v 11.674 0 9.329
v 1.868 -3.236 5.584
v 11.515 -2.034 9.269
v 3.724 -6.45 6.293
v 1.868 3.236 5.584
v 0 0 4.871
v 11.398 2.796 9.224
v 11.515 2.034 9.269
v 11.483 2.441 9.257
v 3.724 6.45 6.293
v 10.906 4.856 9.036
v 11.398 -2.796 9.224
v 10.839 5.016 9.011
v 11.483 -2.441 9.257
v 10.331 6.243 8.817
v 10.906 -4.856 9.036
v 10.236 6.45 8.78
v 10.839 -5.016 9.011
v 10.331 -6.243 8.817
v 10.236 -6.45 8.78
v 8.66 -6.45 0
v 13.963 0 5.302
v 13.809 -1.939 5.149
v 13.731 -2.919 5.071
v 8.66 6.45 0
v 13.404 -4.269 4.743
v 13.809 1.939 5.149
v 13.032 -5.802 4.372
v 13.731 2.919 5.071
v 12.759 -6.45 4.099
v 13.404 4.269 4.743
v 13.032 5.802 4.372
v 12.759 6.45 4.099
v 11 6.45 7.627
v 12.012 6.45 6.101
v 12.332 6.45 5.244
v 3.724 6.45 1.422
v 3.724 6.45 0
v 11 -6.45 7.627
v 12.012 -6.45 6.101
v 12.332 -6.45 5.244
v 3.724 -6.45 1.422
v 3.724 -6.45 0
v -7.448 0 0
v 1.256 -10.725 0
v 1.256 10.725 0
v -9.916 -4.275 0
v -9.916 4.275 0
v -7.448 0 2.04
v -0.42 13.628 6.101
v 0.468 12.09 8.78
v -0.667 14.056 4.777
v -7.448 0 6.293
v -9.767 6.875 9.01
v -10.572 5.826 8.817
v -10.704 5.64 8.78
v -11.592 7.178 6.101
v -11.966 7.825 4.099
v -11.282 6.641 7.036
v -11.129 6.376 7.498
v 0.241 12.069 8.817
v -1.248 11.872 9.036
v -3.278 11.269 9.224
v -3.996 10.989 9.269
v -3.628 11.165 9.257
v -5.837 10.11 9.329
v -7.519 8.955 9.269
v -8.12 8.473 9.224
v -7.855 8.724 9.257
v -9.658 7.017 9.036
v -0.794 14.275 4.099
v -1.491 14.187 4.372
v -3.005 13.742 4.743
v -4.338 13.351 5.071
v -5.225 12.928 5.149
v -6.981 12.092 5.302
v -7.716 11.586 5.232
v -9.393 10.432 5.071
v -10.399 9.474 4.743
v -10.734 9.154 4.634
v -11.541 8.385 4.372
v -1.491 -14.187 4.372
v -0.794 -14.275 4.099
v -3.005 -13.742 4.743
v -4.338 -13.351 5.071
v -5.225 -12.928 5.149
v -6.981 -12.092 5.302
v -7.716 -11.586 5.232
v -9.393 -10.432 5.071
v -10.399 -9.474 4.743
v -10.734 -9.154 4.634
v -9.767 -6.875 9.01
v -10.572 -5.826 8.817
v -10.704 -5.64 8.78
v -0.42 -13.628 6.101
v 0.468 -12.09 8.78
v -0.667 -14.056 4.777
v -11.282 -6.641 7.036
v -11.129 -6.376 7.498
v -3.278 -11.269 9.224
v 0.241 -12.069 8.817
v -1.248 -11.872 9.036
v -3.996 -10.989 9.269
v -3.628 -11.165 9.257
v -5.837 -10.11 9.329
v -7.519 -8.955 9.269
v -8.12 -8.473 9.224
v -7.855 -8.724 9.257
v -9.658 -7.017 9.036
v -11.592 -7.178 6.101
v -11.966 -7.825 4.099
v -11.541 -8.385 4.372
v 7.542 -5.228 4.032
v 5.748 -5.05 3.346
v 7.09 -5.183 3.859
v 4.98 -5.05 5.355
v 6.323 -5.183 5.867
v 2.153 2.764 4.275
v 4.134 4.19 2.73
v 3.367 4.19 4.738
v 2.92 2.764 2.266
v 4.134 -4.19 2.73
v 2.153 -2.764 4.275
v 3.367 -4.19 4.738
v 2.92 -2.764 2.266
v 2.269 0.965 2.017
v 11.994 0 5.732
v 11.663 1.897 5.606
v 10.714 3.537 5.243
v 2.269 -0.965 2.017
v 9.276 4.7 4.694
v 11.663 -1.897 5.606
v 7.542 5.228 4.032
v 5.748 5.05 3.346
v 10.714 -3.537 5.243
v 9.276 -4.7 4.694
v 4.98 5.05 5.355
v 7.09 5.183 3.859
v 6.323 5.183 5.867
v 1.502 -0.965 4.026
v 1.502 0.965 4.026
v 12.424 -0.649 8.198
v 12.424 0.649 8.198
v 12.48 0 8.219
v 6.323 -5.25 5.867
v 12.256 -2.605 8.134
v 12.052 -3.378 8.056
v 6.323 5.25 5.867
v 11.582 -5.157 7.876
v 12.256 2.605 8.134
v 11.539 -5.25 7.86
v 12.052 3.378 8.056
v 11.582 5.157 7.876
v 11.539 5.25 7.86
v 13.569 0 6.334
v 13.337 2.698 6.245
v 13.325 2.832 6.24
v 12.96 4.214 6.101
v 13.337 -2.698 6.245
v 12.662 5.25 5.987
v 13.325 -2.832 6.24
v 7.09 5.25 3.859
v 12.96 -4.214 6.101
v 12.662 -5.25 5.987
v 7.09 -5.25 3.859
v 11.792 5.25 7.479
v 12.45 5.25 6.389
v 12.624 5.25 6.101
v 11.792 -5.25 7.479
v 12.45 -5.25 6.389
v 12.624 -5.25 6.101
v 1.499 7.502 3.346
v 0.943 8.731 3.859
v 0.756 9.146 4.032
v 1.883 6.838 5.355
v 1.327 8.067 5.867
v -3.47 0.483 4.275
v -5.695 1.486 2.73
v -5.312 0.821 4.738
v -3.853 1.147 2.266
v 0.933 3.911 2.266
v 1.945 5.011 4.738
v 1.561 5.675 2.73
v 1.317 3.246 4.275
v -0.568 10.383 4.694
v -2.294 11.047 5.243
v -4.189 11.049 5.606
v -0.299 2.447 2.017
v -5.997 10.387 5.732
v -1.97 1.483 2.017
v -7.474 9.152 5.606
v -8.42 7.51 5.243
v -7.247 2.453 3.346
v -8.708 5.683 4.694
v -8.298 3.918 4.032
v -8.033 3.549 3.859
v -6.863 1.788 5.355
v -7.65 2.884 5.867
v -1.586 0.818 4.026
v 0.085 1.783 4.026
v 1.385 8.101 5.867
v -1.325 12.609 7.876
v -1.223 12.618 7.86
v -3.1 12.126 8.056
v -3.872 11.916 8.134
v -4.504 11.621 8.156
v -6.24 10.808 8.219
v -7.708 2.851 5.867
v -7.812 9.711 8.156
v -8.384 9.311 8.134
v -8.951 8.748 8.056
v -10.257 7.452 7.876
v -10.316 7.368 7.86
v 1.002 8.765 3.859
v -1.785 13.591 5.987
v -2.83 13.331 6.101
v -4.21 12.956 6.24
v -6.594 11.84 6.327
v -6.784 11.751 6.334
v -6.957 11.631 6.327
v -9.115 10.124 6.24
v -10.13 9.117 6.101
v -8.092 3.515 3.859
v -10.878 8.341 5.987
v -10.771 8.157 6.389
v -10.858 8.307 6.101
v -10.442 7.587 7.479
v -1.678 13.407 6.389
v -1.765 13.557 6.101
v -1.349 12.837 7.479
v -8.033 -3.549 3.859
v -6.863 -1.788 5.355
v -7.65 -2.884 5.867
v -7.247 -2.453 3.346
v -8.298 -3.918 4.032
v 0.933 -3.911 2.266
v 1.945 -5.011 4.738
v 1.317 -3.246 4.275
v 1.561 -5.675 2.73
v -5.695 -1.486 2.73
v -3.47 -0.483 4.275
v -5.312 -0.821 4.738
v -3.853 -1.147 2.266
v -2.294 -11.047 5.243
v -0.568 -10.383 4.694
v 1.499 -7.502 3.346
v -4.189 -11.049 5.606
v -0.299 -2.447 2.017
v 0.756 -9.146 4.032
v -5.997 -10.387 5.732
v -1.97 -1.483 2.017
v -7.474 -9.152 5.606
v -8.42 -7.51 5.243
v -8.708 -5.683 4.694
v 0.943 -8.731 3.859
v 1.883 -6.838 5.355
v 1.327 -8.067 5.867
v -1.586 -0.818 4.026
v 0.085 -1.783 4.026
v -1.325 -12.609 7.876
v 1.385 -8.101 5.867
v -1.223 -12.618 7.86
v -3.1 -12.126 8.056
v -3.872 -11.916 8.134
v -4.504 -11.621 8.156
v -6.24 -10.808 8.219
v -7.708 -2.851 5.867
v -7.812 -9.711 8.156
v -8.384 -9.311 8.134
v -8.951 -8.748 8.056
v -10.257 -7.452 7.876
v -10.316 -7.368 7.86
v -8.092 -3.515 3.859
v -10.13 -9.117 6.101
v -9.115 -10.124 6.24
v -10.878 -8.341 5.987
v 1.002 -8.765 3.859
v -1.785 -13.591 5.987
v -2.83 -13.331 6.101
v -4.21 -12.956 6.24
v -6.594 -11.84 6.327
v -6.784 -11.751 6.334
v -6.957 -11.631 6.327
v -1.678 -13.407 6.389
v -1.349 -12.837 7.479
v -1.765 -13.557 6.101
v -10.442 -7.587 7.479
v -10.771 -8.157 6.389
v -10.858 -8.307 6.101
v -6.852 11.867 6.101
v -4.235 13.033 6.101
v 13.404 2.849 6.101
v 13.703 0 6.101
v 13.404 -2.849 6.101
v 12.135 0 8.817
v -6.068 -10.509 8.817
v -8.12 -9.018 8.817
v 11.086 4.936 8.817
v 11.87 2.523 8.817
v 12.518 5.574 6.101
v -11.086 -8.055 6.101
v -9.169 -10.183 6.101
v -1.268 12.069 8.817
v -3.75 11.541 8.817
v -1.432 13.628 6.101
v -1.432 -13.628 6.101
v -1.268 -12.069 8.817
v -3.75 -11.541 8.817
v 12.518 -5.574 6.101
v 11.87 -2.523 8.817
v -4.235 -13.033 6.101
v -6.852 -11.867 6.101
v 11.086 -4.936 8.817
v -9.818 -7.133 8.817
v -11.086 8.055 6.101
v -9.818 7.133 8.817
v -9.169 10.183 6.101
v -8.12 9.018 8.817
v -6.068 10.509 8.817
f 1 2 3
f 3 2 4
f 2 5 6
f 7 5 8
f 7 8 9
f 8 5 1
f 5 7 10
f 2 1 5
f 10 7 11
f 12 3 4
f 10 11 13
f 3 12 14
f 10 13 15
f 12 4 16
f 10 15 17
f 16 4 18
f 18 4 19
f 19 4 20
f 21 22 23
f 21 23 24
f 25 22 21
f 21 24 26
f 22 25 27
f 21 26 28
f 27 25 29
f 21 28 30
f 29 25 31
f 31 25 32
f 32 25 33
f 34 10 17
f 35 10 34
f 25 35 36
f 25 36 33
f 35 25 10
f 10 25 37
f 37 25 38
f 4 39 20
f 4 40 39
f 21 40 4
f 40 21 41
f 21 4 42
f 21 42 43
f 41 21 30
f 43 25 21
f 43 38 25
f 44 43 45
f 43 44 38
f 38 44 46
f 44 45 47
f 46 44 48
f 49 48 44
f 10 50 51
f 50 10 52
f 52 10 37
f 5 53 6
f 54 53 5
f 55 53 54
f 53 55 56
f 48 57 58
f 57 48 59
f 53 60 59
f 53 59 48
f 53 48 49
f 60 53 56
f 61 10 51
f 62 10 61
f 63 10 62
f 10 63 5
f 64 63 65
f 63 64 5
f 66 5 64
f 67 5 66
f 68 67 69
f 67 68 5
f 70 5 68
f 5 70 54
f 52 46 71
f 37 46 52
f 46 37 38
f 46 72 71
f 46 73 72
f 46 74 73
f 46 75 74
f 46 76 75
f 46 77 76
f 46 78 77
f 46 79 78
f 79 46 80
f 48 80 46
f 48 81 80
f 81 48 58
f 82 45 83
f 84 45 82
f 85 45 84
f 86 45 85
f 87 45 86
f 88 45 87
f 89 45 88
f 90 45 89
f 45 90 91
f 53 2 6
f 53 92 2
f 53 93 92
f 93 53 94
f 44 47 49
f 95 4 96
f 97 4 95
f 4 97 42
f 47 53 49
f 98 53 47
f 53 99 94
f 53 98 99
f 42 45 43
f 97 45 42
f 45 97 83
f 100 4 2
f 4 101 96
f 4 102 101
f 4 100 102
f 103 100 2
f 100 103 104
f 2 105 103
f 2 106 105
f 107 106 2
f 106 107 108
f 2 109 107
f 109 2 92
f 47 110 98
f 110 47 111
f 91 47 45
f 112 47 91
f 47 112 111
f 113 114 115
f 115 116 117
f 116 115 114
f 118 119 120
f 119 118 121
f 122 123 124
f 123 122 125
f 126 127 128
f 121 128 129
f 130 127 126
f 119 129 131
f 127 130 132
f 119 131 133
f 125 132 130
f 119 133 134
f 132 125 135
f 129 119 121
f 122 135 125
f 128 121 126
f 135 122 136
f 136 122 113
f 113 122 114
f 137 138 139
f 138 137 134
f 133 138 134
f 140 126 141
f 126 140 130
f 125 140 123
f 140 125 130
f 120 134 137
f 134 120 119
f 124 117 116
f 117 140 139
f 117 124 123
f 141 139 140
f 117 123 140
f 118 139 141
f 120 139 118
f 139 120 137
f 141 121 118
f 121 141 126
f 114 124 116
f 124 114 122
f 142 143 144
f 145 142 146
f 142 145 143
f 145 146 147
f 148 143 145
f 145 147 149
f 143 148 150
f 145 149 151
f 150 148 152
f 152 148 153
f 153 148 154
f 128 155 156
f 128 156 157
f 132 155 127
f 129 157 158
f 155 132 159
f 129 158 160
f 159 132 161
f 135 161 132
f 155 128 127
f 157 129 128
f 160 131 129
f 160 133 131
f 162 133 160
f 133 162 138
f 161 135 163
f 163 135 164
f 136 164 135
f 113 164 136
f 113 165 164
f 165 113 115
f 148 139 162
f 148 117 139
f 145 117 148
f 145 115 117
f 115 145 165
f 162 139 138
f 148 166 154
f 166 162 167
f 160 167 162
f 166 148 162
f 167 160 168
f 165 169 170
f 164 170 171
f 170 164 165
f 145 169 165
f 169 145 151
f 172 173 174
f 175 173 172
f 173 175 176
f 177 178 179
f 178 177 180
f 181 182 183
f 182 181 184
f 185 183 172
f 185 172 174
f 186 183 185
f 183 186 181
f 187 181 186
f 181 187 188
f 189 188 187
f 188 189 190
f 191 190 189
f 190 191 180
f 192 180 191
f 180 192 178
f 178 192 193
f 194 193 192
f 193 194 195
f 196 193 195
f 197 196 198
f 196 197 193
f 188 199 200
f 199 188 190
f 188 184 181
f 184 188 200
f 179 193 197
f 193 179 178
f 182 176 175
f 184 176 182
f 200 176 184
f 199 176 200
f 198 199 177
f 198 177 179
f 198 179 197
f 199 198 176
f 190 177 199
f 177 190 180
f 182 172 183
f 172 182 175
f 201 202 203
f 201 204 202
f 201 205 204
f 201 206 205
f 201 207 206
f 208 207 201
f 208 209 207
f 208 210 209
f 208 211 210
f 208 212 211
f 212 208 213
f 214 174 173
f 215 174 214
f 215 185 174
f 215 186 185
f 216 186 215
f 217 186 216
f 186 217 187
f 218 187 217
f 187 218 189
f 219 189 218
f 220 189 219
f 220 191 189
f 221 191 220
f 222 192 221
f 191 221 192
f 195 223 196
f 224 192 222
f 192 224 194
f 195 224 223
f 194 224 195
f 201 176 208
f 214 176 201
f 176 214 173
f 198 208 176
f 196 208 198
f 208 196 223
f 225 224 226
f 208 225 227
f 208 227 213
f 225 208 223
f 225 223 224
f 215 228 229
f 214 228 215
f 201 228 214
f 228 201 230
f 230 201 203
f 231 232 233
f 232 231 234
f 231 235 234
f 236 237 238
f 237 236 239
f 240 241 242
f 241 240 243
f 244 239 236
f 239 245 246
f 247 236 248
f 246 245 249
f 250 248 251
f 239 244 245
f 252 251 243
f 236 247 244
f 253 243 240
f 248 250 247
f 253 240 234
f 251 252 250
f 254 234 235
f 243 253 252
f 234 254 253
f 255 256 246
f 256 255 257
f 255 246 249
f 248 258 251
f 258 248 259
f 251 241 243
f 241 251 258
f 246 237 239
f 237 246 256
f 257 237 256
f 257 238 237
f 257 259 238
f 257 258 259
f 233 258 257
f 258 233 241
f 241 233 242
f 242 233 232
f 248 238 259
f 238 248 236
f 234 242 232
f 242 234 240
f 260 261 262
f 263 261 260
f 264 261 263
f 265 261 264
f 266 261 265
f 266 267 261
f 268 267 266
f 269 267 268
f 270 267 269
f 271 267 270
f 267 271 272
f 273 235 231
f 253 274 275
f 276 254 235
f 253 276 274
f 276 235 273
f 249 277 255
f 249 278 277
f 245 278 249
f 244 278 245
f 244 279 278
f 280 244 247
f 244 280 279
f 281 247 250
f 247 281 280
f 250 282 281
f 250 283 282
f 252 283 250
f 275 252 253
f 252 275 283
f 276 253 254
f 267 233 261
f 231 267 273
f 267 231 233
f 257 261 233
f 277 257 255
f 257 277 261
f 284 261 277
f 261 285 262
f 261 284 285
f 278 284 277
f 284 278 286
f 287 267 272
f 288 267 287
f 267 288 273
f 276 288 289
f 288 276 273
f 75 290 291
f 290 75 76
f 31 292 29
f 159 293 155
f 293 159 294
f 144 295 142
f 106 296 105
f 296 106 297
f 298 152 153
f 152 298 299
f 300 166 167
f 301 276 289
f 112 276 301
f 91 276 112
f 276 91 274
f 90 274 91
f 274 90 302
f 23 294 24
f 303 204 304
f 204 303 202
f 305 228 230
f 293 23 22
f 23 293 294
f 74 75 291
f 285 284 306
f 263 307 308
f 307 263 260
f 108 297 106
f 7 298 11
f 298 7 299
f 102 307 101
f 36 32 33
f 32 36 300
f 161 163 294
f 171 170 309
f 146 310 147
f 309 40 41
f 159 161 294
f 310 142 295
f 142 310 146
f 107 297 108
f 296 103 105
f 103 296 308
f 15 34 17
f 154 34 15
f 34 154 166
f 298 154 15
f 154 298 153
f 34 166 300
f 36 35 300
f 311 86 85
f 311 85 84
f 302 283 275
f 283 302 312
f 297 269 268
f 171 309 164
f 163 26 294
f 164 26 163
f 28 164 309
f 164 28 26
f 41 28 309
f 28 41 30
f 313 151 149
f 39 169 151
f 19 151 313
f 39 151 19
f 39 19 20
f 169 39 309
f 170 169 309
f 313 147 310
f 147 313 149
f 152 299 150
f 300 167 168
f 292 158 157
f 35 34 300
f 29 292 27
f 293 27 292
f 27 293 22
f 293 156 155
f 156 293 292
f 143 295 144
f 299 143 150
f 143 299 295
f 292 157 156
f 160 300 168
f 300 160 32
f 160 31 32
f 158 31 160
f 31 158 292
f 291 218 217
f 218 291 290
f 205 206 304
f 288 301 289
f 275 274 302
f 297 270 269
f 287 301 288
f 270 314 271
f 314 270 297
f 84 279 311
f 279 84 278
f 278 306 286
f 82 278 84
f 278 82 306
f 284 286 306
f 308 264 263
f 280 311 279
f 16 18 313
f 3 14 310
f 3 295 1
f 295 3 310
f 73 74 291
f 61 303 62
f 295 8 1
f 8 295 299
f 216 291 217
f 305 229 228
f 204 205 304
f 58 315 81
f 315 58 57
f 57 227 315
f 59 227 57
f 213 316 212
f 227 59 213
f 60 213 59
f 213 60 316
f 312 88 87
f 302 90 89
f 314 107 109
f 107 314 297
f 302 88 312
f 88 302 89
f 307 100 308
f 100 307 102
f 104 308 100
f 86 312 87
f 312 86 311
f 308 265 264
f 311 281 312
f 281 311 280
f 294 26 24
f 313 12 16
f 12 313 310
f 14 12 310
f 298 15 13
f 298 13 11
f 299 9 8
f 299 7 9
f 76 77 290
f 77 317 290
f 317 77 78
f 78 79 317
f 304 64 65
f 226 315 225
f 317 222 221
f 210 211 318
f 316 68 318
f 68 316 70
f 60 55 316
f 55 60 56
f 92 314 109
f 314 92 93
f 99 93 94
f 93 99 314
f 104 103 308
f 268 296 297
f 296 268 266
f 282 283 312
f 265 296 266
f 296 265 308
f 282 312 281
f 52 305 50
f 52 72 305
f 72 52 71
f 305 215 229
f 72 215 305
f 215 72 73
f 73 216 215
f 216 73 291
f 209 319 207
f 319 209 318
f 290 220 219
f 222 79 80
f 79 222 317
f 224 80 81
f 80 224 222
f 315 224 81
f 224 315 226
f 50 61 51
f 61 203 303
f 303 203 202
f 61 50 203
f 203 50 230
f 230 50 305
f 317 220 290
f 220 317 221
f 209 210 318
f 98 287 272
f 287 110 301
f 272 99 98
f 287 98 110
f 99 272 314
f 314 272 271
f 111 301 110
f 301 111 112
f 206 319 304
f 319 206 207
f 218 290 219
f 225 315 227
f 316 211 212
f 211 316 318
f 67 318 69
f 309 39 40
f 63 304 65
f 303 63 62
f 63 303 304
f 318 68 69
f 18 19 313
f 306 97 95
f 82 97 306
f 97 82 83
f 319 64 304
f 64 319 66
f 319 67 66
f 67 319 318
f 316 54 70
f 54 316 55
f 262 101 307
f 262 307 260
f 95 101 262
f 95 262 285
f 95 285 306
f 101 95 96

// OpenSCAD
popsicleStickHeight = 2.15;
popsicleStickWidth = 10.5;
popsicleStickLength = 119;

socketLength = 15;
socketThickness = 1.2;
socketHoleDistance = 8.0;

minOverhang = 45;

holeAngles = [[0, -20.905, 0],[0, -20.905, 120], [0, -20.905, -120]];        
socketAngles = [[0, 0, 0], [0, 0, 120], [0, 0, -120]];

sphereRadius = 15;

module hedronVertex(translation, angles){    
    for (iAngle = [0:len(angles)-1]){
        rotate(angles[iAngle]){
            translate(translation){
                children(iAngle);
            }
        }
    }	
}

module popsicleStick() {

	l=popsicleStickLength;
	w=popsicleStickWidth;
	h=popsicleStickHeight;

	union() {
        translate([0,0,-h/2]){
            cylinder(h=h,r=w/2);
            translate(v=[l-w/2,0,-h/2]){
                cylinder(h=h,r=w/2);
            }
        }
        
		translate(v=[0,-w/2,-h/2]){
			cube(size=[l-w/2,w,h]);
		}
	}
}

module popsicleSocket(angle){
	l=socketLength;
	stickW=popsicleStickWidth;
	stickH=popsicleStickHeight;
	wall=socketThickness;
	w = stickW+2*wall;
	h = stickH+2*wall;
    minOverhangCube([l,w,h], angle, 45);	
}

module minOverhangCube(cubeSize, angle, minOverhangAngle){    
    trianglePoint0 = [0, 0];
    trianglePoint1 = [cos(-angle)*cubeSize[0], sin(-angle)*cubeSize[0]];
    trianglePoint2 = [trianglePoint1[0]-(tan(minOverhangAngle)*trianglePoint1[1]), 0];
    translate([0, cubeSize[1]/2, 0])
    {
        rotate([90, 0, 0])
        {
            linear_extrude(height = cubeSize[1])
            {
                rotate(-angle)
                {
                    square(size = [cubeSize[0], cubeSize[2]]);
                }
                polygon(points = [trianglePoint0, trianglePoint1, trianglePoint2]);
            }
        }
    }
}

intersection()
{
   sphere(sphereRadius);
    difference()
    {
    
        hedronVertex([0, 0, 0], socketAngles){
            popsicleSocket(holeAngles[0][1]);
            popsicleSocket(holeAngles[1][1]);
            popsicleSocket(holeAngles[2][1]);
        }
        
        hedronVertex([socketHoleDistance, 0, popsicleStickHeight], holeAngles)
        {
            popsicleStick();
            popsicleStick();
            popsicleStick();
        }
    }
}
